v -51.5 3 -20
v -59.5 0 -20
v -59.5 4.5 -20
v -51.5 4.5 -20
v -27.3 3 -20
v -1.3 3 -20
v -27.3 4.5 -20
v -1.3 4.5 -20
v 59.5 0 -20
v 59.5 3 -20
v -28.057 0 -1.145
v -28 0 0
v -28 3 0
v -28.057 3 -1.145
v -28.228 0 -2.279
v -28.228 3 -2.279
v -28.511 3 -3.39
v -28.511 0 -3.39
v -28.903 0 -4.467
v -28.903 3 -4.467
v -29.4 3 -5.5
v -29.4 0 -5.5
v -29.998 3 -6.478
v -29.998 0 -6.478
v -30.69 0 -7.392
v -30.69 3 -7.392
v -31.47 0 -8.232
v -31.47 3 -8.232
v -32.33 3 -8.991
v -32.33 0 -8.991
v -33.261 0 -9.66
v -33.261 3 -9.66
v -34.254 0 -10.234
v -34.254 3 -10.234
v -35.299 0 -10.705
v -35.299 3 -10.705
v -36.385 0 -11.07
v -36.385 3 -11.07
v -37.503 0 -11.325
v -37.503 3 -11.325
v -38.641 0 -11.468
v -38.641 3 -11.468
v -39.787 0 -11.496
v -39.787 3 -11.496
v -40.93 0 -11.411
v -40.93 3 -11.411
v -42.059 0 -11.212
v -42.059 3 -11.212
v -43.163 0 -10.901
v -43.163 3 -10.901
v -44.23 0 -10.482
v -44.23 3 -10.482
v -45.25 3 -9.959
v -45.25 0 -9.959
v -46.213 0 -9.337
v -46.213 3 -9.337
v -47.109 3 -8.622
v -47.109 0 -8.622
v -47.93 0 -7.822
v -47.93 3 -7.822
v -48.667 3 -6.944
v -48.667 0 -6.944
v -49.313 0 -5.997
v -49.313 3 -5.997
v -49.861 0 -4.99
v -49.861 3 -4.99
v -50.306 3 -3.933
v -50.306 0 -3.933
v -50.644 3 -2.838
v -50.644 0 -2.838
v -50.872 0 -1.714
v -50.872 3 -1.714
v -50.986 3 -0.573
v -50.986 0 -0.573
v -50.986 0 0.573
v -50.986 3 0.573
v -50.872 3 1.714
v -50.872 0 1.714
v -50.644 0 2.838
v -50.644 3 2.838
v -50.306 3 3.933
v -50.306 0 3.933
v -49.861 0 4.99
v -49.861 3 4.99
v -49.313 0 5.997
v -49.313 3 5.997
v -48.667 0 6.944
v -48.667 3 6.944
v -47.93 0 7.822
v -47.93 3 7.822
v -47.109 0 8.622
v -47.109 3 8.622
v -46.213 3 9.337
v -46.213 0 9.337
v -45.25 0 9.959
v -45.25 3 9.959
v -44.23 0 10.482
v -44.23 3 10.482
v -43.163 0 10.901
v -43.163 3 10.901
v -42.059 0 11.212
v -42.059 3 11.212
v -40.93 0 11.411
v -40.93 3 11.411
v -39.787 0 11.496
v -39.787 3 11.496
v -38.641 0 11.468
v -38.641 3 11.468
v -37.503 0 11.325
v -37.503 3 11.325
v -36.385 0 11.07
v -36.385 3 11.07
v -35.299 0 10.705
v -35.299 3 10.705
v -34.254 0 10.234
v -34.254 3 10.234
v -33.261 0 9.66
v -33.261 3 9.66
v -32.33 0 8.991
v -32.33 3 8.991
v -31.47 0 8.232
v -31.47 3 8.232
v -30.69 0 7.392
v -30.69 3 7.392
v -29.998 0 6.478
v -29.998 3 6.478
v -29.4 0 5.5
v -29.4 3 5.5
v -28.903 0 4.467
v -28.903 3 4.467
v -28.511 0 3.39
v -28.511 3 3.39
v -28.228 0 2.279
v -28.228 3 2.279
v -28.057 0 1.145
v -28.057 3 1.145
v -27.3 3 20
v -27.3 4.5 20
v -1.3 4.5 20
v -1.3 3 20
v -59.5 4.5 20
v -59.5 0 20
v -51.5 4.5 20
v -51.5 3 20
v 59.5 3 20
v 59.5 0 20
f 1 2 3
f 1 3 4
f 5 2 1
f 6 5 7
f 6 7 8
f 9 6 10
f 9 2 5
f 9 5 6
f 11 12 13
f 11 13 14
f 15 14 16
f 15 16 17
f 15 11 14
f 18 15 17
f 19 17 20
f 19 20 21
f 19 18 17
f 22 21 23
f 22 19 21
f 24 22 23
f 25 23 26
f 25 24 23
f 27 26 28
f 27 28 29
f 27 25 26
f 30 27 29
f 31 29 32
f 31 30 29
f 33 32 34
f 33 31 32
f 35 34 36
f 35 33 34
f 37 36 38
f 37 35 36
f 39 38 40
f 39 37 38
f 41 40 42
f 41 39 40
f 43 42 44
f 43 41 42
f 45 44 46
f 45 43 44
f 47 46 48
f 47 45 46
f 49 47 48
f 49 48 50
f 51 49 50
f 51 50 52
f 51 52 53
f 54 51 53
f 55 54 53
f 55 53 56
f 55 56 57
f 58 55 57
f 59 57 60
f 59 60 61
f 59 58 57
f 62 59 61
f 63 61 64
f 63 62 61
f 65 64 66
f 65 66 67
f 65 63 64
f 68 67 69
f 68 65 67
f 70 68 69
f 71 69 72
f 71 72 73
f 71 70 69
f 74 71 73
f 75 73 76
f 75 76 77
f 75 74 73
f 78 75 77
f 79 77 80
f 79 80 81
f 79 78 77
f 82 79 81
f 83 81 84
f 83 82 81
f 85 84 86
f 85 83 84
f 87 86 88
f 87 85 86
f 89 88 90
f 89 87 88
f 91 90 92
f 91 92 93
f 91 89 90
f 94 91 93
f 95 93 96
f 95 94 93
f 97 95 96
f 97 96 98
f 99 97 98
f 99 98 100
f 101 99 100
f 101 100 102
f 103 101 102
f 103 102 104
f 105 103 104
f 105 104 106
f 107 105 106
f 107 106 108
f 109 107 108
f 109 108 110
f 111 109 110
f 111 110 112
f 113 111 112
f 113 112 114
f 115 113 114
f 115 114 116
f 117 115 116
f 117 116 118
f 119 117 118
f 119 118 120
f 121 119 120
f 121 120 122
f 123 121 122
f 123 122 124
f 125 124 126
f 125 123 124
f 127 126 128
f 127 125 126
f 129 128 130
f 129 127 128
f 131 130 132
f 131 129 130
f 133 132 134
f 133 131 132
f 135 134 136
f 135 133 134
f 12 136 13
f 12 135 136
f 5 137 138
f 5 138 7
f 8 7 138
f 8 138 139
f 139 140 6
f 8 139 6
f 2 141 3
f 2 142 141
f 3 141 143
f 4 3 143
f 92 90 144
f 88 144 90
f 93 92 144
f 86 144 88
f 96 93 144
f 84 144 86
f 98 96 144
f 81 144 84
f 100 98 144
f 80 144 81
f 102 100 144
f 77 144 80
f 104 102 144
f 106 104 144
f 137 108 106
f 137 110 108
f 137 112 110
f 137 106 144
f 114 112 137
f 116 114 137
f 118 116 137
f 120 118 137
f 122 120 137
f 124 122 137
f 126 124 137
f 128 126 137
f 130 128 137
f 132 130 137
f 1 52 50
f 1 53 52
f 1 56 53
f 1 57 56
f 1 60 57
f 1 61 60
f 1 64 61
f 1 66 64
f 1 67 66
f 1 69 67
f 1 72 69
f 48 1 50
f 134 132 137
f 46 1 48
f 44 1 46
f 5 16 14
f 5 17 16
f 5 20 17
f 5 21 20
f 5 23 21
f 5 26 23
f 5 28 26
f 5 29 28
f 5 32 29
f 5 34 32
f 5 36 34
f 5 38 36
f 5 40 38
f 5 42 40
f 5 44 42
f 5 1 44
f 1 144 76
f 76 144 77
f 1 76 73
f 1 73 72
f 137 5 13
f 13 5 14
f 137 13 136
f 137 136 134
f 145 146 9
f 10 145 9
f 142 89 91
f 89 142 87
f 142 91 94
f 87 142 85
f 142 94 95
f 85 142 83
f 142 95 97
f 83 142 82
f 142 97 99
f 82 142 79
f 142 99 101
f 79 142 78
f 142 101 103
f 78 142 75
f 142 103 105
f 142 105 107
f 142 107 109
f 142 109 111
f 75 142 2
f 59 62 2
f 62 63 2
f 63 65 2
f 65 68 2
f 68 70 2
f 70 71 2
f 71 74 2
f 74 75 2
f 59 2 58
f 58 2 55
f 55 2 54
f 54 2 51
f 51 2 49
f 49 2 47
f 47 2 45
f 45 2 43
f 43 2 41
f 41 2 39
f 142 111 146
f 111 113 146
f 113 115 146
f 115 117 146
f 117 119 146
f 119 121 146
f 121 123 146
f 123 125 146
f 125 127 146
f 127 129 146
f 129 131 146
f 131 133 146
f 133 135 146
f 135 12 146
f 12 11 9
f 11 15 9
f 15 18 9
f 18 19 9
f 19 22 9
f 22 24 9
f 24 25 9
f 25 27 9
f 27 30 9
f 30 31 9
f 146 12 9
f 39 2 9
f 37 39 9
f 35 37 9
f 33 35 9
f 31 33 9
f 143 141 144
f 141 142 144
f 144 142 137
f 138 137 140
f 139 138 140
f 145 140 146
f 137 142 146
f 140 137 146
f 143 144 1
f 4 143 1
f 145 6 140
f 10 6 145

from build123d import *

# Parameters (mm, degrees)
SKETCH1_W           = 119
SKETCH1_H           = 40
SKETCH1_R           = 11.5
BOSS_EXTRUDE1_DEPTH = 3
SKETCH2_W           = 26
SKETCH2_H           = 40
SKETCH2_W_2         = 8
BOSS_EXTRUDE2_DEPTH = 1.5


with BuildPart() as part:
    # Sketch1 → Boss-Extrude1 (new body)
    with BuildSketch(Plane(origin=(0, 0, 0), x_dir=(1, 0, 0), z_dir=(0, 1, 0))):
        Rectangle(SKETCH1_W, SKETCH1_H)
        with Locations((-39.5, 0)):
            Circle(SKETCH1_R, mode=Mode.SUBTRACT)
    extrude(amount=BOSS_EXTRUDE1_DEPTH)

    # Sketch2 → Boss-Extrude2 (add)
    with BuildSketch(Plane(origin=(0, 3, 0), x_dir=(1, 0, 0), z_dir=(0, 1, 0))):
        with Locations((-14.3, 0)):
            Rectangle(SKETCH2_W, SKETCH2_H)
        with Locations((-55.5, 0)):
            Rectangle(SKETCH2_W_2, SKETCH2_H)
    extrude(amount=BOSS_EXTRUDE2_DEPTH)


solid = part.part
